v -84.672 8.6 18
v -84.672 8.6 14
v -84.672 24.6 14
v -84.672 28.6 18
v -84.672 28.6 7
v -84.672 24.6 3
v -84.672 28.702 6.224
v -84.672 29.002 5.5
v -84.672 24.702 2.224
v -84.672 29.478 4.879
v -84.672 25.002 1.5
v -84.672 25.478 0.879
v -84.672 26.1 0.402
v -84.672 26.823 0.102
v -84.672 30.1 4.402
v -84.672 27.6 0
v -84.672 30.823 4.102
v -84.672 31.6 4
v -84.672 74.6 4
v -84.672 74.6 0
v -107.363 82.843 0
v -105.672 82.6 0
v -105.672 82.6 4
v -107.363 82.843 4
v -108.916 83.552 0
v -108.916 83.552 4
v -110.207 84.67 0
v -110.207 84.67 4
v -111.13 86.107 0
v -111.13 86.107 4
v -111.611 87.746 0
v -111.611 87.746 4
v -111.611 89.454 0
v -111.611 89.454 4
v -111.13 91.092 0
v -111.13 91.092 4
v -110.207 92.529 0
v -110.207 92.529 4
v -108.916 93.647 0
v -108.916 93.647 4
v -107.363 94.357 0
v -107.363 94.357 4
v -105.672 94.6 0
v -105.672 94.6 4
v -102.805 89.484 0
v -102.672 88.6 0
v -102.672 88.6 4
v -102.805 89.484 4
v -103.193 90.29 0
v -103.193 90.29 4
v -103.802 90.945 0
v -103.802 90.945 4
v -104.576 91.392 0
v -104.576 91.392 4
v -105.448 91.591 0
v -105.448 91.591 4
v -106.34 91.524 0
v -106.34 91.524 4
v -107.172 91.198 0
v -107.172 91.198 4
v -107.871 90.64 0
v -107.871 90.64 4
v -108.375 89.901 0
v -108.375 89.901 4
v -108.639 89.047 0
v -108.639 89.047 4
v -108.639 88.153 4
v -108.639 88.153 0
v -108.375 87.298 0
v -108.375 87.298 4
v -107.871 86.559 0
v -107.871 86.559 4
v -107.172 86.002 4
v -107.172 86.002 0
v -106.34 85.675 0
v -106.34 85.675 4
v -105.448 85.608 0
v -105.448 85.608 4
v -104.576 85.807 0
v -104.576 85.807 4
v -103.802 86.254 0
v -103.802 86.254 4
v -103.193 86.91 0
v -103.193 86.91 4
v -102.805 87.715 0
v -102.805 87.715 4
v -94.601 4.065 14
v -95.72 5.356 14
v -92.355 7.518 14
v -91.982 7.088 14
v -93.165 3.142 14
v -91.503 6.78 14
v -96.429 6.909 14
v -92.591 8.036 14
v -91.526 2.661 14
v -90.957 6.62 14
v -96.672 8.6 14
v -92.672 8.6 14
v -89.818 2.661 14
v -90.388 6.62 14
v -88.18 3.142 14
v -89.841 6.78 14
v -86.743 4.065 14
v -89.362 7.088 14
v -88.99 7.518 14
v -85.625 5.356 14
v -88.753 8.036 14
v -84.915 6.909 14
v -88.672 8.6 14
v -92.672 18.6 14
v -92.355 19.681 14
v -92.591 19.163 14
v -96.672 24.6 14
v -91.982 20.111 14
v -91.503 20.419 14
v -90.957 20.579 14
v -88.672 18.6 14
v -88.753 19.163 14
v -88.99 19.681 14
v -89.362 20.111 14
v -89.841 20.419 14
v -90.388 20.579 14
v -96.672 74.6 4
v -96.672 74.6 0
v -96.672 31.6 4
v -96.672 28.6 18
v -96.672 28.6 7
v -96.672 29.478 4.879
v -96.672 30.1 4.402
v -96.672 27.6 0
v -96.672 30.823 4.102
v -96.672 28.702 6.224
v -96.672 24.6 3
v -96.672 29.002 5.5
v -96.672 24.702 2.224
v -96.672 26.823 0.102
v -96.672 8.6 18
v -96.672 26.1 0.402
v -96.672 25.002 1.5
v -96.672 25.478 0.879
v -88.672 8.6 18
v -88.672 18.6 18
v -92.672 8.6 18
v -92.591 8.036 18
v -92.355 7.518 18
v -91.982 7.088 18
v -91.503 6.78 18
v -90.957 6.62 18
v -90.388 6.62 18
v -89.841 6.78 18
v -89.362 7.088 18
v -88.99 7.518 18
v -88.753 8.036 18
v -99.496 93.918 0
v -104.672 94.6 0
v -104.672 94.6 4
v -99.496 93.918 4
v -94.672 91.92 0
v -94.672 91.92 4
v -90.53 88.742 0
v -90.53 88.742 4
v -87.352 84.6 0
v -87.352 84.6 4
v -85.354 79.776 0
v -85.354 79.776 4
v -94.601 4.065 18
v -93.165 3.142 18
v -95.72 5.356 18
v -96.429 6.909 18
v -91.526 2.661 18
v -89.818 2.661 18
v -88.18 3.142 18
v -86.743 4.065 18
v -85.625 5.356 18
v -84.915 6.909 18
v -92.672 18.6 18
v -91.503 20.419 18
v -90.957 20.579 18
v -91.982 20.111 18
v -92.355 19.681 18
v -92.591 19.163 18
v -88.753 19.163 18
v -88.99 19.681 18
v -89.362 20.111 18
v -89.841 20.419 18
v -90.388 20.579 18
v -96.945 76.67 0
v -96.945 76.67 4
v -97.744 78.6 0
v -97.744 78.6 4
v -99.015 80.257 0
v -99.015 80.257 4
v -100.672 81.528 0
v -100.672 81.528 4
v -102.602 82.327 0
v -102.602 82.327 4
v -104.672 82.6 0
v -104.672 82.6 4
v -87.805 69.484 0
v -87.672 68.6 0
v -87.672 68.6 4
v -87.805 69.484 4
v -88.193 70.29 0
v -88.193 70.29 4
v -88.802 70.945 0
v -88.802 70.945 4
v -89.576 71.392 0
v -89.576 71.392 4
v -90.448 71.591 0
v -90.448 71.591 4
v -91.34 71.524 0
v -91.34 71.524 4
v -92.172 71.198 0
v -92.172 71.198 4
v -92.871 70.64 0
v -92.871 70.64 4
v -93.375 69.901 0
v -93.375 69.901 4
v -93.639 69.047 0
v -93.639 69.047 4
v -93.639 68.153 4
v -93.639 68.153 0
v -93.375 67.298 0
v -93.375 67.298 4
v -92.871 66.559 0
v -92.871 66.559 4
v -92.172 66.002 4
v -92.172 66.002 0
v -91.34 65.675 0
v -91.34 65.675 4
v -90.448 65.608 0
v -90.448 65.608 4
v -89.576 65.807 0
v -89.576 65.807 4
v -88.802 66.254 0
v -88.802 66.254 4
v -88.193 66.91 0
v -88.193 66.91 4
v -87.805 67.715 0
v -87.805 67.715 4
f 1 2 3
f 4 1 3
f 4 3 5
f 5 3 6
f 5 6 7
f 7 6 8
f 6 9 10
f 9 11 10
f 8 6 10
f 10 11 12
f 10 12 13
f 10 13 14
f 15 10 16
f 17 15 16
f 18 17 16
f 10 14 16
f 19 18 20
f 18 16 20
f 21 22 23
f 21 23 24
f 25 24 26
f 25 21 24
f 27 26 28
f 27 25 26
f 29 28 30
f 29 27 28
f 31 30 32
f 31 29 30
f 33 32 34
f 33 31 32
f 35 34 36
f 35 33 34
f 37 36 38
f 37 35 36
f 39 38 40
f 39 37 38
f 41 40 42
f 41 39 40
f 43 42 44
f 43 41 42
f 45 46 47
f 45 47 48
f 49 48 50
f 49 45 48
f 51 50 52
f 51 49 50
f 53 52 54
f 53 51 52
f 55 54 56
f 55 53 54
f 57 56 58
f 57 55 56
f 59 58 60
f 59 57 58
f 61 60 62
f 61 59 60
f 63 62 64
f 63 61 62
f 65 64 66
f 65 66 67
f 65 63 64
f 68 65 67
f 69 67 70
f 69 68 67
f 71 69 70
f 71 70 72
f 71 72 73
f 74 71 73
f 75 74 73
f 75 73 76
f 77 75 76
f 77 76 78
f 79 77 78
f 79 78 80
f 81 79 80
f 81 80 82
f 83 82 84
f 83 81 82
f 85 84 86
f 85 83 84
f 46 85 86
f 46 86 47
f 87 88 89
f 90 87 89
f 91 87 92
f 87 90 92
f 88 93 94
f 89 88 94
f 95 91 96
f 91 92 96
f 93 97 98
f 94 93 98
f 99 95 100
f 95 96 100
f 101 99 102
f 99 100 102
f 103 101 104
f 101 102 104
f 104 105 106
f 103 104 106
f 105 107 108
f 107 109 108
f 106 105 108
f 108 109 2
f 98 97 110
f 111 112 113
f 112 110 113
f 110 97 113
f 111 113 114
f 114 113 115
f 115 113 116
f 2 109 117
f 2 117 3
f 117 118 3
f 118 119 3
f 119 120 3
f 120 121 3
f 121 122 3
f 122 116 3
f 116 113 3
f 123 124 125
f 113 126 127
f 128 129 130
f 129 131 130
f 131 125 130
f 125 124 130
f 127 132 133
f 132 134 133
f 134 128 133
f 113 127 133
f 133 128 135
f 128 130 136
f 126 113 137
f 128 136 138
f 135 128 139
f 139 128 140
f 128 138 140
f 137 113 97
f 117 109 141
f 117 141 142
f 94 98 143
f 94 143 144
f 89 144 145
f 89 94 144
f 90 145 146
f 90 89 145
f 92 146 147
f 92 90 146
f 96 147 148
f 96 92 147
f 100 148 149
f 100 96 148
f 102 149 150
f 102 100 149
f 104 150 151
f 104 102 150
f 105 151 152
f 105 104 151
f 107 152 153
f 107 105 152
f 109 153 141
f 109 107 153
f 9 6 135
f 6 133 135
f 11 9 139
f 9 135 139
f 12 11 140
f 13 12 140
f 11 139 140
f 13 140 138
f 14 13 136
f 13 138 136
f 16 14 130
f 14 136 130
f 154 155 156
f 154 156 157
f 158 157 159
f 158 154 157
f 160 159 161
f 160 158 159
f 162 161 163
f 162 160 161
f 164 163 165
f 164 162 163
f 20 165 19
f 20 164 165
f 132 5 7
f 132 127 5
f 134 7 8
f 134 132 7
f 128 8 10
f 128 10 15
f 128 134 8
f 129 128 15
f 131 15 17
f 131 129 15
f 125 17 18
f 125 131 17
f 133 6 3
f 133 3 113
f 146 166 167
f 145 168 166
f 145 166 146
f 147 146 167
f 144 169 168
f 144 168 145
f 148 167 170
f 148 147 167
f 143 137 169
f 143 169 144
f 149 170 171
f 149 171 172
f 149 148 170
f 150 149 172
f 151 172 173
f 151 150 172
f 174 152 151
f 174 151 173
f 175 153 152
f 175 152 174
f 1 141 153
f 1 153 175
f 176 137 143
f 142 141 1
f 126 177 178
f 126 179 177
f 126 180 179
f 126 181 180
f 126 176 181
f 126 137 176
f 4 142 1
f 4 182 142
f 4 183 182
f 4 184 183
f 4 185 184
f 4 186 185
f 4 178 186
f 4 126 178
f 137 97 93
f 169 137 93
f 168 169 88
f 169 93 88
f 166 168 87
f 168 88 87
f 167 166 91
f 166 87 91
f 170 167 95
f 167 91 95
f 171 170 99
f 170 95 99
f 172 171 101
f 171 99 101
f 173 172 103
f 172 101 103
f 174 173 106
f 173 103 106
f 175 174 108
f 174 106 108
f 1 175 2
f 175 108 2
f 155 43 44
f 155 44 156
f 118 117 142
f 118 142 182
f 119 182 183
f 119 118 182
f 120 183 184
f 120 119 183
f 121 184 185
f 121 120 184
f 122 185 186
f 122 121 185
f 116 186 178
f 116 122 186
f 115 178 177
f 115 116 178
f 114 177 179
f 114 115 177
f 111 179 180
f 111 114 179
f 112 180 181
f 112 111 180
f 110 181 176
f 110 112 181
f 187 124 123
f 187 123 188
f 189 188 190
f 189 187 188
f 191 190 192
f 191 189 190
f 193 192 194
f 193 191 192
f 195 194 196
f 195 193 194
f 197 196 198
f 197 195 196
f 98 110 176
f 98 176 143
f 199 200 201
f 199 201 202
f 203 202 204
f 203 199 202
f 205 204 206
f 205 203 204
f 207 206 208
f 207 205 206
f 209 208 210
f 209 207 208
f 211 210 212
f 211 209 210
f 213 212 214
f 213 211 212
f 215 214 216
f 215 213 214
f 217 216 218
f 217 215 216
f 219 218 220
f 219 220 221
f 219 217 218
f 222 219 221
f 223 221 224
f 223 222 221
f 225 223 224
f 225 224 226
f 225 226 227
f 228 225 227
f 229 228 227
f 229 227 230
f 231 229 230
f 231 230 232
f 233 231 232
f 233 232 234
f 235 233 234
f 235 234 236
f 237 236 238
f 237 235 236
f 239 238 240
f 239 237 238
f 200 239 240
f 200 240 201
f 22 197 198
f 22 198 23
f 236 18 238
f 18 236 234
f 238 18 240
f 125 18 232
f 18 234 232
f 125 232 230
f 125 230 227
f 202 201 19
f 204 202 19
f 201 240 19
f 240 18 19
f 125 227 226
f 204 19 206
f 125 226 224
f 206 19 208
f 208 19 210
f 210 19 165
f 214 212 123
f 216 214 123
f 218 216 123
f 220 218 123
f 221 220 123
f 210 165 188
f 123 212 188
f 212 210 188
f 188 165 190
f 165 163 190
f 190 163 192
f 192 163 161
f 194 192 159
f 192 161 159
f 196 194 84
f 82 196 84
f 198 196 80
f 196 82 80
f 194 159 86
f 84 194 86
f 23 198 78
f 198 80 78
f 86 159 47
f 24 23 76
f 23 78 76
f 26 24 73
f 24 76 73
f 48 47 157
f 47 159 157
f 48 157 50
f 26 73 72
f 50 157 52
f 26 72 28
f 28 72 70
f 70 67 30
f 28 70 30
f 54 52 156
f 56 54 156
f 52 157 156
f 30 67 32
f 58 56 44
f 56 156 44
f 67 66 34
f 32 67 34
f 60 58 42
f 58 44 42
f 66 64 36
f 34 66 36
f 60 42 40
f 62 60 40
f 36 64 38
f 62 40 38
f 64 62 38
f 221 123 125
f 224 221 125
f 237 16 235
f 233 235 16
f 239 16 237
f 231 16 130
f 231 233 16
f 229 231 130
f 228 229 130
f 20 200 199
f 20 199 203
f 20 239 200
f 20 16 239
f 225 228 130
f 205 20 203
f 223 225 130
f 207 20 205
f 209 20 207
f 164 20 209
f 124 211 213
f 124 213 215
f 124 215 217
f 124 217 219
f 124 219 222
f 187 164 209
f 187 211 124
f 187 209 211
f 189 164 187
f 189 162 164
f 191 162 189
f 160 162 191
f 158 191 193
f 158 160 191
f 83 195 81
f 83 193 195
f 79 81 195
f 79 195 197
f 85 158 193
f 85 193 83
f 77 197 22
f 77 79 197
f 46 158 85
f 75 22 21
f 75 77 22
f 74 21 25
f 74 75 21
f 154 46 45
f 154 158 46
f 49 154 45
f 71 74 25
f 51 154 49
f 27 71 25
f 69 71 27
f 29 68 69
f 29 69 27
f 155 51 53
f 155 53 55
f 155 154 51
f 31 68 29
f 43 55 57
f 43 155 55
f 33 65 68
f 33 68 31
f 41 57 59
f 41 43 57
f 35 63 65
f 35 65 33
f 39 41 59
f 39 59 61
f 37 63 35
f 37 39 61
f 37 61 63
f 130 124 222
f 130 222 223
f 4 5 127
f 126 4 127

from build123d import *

# Parameters (mm, degrees)
SKETCH1_R           = 3
BOSS_EXTRUDE1_DEPTH = 4
BOSS_EXTRUDE2_DEPTH = 14
CUT_EXTRUDE1_DEPTH  = 14
FILLET1_R           = 3


with BuildPart() as part:
    # Sketch1 → Boss-Extrude1 (new body)
    with BuildSketch(Plane.XY):
        with BuildLine():
            Line((-96.672208827, 8.599646064), (-96.672208827, 74.599646064))
            ThreePointArc((-96.672208827, 74.599646064), (-99.015354577, 80.256500313), (-104.672208827, 82.599646064))
            Line((-104.672208827, 82.599646064), (-105.672208827, 82.599646064))
            ThreePointArc((-105.672208827, 82.599646064), (-111.672208827, 88.599646064), (-105.672208827, 94.599646064))
            Line((-105.672208827, 94.599646064), (-104.672208827, 94.599646064))
            ThreePointArc((-104.672208827, 94.599646064), (-90.530073203, 88.741781688), (-84.672208827, 74.599646064))
            Line((-84.672208827, 74.599646064), (-84.672208827, 8.599646064))
            ThreePointArc((-84.672208827, 8.599646064), (-90.672208827, 2.599646064), (-96.672208827, 8.599646064))
        make_face()
        with Locations((-90.672208827, 68.599646064)):
            Circle(SKETCH1_R, mode=Mode.SUBTRACT)
        with Locations((-105.672208827, 88.599646064)):
            Circle(SKETCH1_R, mode=Mode.SUBTRACT)
        with BuildLine():
            Line((-92.672208827, 8.599646064), (-92.672208827, 18.599646064))
            ThreePointArc((-92.672208827, 18.599646064), (-90.672208827, 20.599646064), (-88.672208827, 18.599646064))
            Line((-88.672208827, 18.599646064), (-88.672208827, 8.599646064))
            ThreePointArc((-88.672208827, 8.599646064), (-90.672208827, 6.599646064), (-92.672208827, 8.599646064))
        make_face(mode=Mode.SUBTRACT)
    extrude(amount=BOSS_EXTRUDE1_DEPTH)

    # Sketch2 → Boss-Extrude2 (add)
    with BuildSketch(Plane(origin=(0, 0, 4), x_dir=(-1, 0, 0), z_dir=(0, 0, -1))):
        with BuildLine():
            Line((84.672208827, 28.599646064), (96.672208827, 28.599646064))
            Line((96.672208827, 28.599646064), (96.672208827, 8.599646064))
            ThreePointArc((96.672208827, 8.599646064), (90.672208827, 2.599646064), (84.672208827, 8.599646064))
            Line((84.672208827, 8.599646064), (84.672208827, 28.599646064))
        make_face()
        with BuildLine():
            Line((88.672208827, 8.599646064), (88.672208827, 18.599646064))
            ThreePointArc((88.672208827, 18.599646064), (90.672208827, 20.599646064), (92.672208827, 18.599646064))
            Line((92.672208827, 18.599646064), (92.672208827, 8.599646064))
            ThreePointArc((92.672208827, 8.599646064), (90.672208827, 6.599646064), (88.672208827, 8.599646064))
        make_face(mode=Mode.SUBTRACT)
    extrude(amount=-BOSS_EXTRUDE2_DEPTH)

    # Sketch3 → Cut-Extrude1 (cut)
    with BuildSketch(Plane(origin=(0, 0, 0), x_dir=(-1, 0, 0), z_dir=(0, 0, -1))):
        with BuildLine():
            Line((84.672208827, 8.599646064), (84.672208827, 24.599646064))
            Line((84.672208827, 24.599646064), (96.672208827, 24.599646064))
            Line((96.672208827, 24.599646064), (96.672208827, 8.599646064))
            ThreePointArc((96.672208827, 8.599646064), (90.672208827, 2.599646064), (84.672208827, 8.599646064))
        make_face()
        with BuildLine():
            Line((88.672208827, 8.599646064), (88.672208827, 18.599646064))
            ThreePointArc((88.672208827, 18.599646064), (90.672208827, 20.599646064), (92.672208827, 18.599646064))
            Line((92.672208827, 18.599646064), (92.672208827, 8.599646064))
            ThreePointArc((92.672208827, 8.599646064), (90.672208827, 6.599646064), (88.672208827, 8.599646064))
        make_face(mode=Mode.SUBTRACT)
    extrude(amount=-CUT_EXTRUDE1_DEPTH, mode=Mode.SUBTRACT)

    # Fillet1
    fillet1_edges = [part.edges().sort_by_distance(p)[0] for p in [
        (-90.672208827, 28.599646064, 4),
        (-90.672208827, 24.599646064, 0),
    ]]
    fillet(fillet1_edges, radius=FILLET1_R)


solid = part.part
